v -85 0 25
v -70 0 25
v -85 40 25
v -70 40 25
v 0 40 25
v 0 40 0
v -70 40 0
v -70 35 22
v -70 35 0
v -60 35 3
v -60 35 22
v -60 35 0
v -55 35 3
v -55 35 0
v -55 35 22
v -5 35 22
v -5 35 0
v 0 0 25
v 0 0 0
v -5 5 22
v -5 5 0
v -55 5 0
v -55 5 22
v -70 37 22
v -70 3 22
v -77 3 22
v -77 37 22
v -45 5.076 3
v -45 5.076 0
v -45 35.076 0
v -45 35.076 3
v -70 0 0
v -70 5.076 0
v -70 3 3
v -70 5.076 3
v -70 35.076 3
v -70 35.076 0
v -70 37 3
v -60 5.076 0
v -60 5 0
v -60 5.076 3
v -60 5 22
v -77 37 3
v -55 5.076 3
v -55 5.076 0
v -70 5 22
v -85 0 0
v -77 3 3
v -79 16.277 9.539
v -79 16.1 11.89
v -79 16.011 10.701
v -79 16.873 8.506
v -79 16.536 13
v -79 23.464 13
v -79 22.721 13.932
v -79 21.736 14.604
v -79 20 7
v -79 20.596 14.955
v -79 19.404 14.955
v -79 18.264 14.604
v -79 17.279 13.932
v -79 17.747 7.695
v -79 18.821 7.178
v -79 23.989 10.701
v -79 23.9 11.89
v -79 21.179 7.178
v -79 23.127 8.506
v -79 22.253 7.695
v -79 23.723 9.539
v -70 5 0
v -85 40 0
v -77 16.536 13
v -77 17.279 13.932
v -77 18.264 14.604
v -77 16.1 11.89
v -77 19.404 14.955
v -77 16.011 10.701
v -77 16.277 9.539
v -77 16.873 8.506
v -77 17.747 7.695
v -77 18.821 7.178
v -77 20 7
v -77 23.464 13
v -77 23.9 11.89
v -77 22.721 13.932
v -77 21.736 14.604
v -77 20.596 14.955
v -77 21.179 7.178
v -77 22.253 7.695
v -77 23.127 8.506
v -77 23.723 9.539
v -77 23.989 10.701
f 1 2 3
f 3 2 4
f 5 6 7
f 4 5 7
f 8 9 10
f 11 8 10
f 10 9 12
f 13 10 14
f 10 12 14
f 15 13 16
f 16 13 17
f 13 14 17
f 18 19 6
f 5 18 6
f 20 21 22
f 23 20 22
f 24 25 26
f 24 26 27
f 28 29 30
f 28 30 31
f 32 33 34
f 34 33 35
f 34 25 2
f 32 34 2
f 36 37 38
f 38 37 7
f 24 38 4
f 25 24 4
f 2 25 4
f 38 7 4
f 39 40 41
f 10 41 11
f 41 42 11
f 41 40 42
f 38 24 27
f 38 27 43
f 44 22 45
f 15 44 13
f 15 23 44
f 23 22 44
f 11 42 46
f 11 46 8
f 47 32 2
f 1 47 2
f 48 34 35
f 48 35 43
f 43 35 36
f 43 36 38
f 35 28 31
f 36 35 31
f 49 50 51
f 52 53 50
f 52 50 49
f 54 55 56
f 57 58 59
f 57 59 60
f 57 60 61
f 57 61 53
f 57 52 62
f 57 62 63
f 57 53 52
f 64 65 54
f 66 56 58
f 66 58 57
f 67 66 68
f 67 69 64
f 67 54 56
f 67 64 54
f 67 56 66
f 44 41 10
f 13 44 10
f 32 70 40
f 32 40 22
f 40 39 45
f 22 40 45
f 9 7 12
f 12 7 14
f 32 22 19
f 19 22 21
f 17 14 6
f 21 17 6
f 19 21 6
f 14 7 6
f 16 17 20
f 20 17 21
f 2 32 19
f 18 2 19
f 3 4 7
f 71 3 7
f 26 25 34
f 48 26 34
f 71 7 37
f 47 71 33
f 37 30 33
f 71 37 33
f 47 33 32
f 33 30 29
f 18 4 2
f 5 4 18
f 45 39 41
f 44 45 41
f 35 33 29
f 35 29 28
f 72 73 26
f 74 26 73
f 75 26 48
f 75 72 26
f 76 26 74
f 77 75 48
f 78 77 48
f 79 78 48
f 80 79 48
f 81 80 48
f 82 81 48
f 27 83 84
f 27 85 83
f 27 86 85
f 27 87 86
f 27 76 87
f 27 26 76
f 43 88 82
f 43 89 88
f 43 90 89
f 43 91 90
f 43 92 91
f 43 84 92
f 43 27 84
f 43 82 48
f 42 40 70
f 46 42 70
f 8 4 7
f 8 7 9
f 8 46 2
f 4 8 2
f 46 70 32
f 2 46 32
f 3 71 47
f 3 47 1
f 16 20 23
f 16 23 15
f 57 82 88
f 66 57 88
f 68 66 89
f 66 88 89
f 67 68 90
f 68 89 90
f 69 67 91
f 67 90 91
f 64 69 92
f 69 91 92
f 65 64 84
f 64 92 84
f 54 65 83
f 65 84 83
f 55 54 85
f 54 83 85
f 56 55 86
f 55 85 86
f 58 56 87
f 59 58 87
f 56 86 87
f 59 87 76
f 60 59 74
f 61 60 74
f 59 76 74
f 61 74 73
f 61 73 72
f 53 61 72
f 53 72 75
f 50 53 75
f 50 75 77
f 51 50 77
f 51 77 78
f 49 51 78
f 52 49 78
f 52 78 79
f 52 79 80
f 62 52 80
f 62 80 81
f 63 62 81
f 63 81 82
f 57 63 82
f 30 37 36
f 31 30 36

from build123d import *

# Parameters (mm, degrees)
EXTRUDE_1_DEPTH     = 25
SKETCH_2_W          = 3
SKETCH_2_H          = 40
EXTRUDE_2_DEPTH     = 70
SKETCH_4_W          = 5
SKETCH_4_H          = 30
EXTRUDE_3_DEPTH     = 22
SKETCH_11_W         = 3
SKETCH_11_H         = 29.924086267
CUT_EXTRUDE_3_DEPTH = 7
SKETCH_13_W         = 3
SKETCH_13_H         = 30
EXTRUDE_5_DEPTH     = 25
SKETCH_6_W          = 3
SKETCH_6_H          = 5
SKETCH_6_H_2        = 30
SKETCH_6_W_2        = 19
SKETCH_6_W_3        = 22
SKETCH_6_H_3        = 40
EXTRUDE_6_DEPTH     = 15
SKETCH_14_W         = 19
SKETCH_14_H         = 34
SKETCH_14_R         = 4
CUT_EXTRUDE_4_DEPTH = 7
SKETCH_14_2_R       = 4
CUT_EXTRUDE_5_DEPTH = 9


with BuildPart() as part:
    # 스케치1 → 보스-돌출1 (new body)
    with BuildSketch(Plane.XY):
        Polygon((-70, 5), (-70, 0), (0, 0), (0, 40), (-70, 40), (-70, 35), (-5, 35), (-5, 5), align=None)
    extrude(amount=EXTRUDE_1_DEPTH)

    # 스케치2 → 보스-돌출2 (add)
    with BuildSketch(Plane(origin=(0, 0, 0), x_dir=(0, 0, -1), z_dir=(1, 0, 0))):
        with Locations((-23.5, 20)):
            Rectangle(SKETCH_2_W, SKETCH_2_H)
    extrude(amount=-EXTRUDE_2_DEPTH)

    # 스케치4 → 보스-돌출3 (add)
    with BuildSketch(Plane(origin=(0, 0, 22), x_dir=(-1, 0, 0), z_dir=(0, 0, -1))):
        with Locations((57.5, 20)):
            Rectangle(SKETCH_4_W, SKETCH_4_H)
    extrude(amount=EXTRUDE_3_DEPTH)

    # 스케치11 → 컷-돌출3 (cut)
    with BuildSketch(Plane.ZY.offset(60)):
        with Locations((1.5, 20.037956867)):
            Rectangle(SKETCH_11_W, SKETCH_11_H)
    extrude(amount=-CUT_EXTRUDE_3_DEPTH, mode=Mode.SUBTRACT)


with BuildPart() as body_2:
    # 스케치13 → 보스-돌출5 (new body)
    with BuildSketch(Plane.ZY.offset(70)):
        with Locations((1.5, 20.075913733)):
            Rectangle(SKETCH_13_W, SKETCH_13_H)
    extrude(amount=-EXTRUDE_5_DEPTH)

    # 스케치6 → 보스-돌출6 (add)
    with BuildSketch(Plane.ZY.offset(70)):
        with Locations((1.5, 2.5)):
            Rectangle(SKETCH_6_W, SKETCH_6_H)
        with Locations((1.5, 20)):
            Rectangle(SKETCH_6_W, SKETCH_6_H_2)
        with Locations((1.5, 37.5)):
            Rectangle(SKETCH_6_W, SKETCH_6_H)
        with Locations((12.5, 20)):
            Rectangle(SKETCH_6_W_2, SKETCH_6_H_2)
        Polygon((25, 40), (3, 40), (3, 35), (22, 35), (22, 5), (3, 5), (3, 0), (25, 0), align=None)
        with Locations((14, 20)):
            Rectangle(SKETCH_6_W_3, SKETCH_6_H_3)
    extrude(amount=EXTRUDE_6_DEPTH)

    # 스케치14 → 컷-돌출4 (cut)
    with BuildSketch(Plane(origin=(-70, 0, 0), x_dir=(0, 0, -1), z_dir=(1, 0, 0))):
        with Locations((-12.5, 20)):
            Rectangle(SKETCH_14_W, SKETCH_14_H)
        with Locations((-11, 20)):
            Circle(SKETCH_14_R, mode=Mode.SUBTRACT)
    extrude(amount=-CUT_EXTRUDE_4_DEPTH, mode=Mode.SUBTRACT)

    # 스케치14<2> → 컷-돌출5 (cut)
    with BuildSketch(Plane(origin=(-70, 0, 0), x_dir=(0, 0, -1), z_dir=(1, 0, 0))):
        with Locations((-11, 20)):
            Circle(SKETCH_14_2_R)
    extrude(amount=-CUT_EXTRUDE_5_DEPTH, mode=Mode.SUBTRACT)


solid = Compound([part.part, body_2.part])
